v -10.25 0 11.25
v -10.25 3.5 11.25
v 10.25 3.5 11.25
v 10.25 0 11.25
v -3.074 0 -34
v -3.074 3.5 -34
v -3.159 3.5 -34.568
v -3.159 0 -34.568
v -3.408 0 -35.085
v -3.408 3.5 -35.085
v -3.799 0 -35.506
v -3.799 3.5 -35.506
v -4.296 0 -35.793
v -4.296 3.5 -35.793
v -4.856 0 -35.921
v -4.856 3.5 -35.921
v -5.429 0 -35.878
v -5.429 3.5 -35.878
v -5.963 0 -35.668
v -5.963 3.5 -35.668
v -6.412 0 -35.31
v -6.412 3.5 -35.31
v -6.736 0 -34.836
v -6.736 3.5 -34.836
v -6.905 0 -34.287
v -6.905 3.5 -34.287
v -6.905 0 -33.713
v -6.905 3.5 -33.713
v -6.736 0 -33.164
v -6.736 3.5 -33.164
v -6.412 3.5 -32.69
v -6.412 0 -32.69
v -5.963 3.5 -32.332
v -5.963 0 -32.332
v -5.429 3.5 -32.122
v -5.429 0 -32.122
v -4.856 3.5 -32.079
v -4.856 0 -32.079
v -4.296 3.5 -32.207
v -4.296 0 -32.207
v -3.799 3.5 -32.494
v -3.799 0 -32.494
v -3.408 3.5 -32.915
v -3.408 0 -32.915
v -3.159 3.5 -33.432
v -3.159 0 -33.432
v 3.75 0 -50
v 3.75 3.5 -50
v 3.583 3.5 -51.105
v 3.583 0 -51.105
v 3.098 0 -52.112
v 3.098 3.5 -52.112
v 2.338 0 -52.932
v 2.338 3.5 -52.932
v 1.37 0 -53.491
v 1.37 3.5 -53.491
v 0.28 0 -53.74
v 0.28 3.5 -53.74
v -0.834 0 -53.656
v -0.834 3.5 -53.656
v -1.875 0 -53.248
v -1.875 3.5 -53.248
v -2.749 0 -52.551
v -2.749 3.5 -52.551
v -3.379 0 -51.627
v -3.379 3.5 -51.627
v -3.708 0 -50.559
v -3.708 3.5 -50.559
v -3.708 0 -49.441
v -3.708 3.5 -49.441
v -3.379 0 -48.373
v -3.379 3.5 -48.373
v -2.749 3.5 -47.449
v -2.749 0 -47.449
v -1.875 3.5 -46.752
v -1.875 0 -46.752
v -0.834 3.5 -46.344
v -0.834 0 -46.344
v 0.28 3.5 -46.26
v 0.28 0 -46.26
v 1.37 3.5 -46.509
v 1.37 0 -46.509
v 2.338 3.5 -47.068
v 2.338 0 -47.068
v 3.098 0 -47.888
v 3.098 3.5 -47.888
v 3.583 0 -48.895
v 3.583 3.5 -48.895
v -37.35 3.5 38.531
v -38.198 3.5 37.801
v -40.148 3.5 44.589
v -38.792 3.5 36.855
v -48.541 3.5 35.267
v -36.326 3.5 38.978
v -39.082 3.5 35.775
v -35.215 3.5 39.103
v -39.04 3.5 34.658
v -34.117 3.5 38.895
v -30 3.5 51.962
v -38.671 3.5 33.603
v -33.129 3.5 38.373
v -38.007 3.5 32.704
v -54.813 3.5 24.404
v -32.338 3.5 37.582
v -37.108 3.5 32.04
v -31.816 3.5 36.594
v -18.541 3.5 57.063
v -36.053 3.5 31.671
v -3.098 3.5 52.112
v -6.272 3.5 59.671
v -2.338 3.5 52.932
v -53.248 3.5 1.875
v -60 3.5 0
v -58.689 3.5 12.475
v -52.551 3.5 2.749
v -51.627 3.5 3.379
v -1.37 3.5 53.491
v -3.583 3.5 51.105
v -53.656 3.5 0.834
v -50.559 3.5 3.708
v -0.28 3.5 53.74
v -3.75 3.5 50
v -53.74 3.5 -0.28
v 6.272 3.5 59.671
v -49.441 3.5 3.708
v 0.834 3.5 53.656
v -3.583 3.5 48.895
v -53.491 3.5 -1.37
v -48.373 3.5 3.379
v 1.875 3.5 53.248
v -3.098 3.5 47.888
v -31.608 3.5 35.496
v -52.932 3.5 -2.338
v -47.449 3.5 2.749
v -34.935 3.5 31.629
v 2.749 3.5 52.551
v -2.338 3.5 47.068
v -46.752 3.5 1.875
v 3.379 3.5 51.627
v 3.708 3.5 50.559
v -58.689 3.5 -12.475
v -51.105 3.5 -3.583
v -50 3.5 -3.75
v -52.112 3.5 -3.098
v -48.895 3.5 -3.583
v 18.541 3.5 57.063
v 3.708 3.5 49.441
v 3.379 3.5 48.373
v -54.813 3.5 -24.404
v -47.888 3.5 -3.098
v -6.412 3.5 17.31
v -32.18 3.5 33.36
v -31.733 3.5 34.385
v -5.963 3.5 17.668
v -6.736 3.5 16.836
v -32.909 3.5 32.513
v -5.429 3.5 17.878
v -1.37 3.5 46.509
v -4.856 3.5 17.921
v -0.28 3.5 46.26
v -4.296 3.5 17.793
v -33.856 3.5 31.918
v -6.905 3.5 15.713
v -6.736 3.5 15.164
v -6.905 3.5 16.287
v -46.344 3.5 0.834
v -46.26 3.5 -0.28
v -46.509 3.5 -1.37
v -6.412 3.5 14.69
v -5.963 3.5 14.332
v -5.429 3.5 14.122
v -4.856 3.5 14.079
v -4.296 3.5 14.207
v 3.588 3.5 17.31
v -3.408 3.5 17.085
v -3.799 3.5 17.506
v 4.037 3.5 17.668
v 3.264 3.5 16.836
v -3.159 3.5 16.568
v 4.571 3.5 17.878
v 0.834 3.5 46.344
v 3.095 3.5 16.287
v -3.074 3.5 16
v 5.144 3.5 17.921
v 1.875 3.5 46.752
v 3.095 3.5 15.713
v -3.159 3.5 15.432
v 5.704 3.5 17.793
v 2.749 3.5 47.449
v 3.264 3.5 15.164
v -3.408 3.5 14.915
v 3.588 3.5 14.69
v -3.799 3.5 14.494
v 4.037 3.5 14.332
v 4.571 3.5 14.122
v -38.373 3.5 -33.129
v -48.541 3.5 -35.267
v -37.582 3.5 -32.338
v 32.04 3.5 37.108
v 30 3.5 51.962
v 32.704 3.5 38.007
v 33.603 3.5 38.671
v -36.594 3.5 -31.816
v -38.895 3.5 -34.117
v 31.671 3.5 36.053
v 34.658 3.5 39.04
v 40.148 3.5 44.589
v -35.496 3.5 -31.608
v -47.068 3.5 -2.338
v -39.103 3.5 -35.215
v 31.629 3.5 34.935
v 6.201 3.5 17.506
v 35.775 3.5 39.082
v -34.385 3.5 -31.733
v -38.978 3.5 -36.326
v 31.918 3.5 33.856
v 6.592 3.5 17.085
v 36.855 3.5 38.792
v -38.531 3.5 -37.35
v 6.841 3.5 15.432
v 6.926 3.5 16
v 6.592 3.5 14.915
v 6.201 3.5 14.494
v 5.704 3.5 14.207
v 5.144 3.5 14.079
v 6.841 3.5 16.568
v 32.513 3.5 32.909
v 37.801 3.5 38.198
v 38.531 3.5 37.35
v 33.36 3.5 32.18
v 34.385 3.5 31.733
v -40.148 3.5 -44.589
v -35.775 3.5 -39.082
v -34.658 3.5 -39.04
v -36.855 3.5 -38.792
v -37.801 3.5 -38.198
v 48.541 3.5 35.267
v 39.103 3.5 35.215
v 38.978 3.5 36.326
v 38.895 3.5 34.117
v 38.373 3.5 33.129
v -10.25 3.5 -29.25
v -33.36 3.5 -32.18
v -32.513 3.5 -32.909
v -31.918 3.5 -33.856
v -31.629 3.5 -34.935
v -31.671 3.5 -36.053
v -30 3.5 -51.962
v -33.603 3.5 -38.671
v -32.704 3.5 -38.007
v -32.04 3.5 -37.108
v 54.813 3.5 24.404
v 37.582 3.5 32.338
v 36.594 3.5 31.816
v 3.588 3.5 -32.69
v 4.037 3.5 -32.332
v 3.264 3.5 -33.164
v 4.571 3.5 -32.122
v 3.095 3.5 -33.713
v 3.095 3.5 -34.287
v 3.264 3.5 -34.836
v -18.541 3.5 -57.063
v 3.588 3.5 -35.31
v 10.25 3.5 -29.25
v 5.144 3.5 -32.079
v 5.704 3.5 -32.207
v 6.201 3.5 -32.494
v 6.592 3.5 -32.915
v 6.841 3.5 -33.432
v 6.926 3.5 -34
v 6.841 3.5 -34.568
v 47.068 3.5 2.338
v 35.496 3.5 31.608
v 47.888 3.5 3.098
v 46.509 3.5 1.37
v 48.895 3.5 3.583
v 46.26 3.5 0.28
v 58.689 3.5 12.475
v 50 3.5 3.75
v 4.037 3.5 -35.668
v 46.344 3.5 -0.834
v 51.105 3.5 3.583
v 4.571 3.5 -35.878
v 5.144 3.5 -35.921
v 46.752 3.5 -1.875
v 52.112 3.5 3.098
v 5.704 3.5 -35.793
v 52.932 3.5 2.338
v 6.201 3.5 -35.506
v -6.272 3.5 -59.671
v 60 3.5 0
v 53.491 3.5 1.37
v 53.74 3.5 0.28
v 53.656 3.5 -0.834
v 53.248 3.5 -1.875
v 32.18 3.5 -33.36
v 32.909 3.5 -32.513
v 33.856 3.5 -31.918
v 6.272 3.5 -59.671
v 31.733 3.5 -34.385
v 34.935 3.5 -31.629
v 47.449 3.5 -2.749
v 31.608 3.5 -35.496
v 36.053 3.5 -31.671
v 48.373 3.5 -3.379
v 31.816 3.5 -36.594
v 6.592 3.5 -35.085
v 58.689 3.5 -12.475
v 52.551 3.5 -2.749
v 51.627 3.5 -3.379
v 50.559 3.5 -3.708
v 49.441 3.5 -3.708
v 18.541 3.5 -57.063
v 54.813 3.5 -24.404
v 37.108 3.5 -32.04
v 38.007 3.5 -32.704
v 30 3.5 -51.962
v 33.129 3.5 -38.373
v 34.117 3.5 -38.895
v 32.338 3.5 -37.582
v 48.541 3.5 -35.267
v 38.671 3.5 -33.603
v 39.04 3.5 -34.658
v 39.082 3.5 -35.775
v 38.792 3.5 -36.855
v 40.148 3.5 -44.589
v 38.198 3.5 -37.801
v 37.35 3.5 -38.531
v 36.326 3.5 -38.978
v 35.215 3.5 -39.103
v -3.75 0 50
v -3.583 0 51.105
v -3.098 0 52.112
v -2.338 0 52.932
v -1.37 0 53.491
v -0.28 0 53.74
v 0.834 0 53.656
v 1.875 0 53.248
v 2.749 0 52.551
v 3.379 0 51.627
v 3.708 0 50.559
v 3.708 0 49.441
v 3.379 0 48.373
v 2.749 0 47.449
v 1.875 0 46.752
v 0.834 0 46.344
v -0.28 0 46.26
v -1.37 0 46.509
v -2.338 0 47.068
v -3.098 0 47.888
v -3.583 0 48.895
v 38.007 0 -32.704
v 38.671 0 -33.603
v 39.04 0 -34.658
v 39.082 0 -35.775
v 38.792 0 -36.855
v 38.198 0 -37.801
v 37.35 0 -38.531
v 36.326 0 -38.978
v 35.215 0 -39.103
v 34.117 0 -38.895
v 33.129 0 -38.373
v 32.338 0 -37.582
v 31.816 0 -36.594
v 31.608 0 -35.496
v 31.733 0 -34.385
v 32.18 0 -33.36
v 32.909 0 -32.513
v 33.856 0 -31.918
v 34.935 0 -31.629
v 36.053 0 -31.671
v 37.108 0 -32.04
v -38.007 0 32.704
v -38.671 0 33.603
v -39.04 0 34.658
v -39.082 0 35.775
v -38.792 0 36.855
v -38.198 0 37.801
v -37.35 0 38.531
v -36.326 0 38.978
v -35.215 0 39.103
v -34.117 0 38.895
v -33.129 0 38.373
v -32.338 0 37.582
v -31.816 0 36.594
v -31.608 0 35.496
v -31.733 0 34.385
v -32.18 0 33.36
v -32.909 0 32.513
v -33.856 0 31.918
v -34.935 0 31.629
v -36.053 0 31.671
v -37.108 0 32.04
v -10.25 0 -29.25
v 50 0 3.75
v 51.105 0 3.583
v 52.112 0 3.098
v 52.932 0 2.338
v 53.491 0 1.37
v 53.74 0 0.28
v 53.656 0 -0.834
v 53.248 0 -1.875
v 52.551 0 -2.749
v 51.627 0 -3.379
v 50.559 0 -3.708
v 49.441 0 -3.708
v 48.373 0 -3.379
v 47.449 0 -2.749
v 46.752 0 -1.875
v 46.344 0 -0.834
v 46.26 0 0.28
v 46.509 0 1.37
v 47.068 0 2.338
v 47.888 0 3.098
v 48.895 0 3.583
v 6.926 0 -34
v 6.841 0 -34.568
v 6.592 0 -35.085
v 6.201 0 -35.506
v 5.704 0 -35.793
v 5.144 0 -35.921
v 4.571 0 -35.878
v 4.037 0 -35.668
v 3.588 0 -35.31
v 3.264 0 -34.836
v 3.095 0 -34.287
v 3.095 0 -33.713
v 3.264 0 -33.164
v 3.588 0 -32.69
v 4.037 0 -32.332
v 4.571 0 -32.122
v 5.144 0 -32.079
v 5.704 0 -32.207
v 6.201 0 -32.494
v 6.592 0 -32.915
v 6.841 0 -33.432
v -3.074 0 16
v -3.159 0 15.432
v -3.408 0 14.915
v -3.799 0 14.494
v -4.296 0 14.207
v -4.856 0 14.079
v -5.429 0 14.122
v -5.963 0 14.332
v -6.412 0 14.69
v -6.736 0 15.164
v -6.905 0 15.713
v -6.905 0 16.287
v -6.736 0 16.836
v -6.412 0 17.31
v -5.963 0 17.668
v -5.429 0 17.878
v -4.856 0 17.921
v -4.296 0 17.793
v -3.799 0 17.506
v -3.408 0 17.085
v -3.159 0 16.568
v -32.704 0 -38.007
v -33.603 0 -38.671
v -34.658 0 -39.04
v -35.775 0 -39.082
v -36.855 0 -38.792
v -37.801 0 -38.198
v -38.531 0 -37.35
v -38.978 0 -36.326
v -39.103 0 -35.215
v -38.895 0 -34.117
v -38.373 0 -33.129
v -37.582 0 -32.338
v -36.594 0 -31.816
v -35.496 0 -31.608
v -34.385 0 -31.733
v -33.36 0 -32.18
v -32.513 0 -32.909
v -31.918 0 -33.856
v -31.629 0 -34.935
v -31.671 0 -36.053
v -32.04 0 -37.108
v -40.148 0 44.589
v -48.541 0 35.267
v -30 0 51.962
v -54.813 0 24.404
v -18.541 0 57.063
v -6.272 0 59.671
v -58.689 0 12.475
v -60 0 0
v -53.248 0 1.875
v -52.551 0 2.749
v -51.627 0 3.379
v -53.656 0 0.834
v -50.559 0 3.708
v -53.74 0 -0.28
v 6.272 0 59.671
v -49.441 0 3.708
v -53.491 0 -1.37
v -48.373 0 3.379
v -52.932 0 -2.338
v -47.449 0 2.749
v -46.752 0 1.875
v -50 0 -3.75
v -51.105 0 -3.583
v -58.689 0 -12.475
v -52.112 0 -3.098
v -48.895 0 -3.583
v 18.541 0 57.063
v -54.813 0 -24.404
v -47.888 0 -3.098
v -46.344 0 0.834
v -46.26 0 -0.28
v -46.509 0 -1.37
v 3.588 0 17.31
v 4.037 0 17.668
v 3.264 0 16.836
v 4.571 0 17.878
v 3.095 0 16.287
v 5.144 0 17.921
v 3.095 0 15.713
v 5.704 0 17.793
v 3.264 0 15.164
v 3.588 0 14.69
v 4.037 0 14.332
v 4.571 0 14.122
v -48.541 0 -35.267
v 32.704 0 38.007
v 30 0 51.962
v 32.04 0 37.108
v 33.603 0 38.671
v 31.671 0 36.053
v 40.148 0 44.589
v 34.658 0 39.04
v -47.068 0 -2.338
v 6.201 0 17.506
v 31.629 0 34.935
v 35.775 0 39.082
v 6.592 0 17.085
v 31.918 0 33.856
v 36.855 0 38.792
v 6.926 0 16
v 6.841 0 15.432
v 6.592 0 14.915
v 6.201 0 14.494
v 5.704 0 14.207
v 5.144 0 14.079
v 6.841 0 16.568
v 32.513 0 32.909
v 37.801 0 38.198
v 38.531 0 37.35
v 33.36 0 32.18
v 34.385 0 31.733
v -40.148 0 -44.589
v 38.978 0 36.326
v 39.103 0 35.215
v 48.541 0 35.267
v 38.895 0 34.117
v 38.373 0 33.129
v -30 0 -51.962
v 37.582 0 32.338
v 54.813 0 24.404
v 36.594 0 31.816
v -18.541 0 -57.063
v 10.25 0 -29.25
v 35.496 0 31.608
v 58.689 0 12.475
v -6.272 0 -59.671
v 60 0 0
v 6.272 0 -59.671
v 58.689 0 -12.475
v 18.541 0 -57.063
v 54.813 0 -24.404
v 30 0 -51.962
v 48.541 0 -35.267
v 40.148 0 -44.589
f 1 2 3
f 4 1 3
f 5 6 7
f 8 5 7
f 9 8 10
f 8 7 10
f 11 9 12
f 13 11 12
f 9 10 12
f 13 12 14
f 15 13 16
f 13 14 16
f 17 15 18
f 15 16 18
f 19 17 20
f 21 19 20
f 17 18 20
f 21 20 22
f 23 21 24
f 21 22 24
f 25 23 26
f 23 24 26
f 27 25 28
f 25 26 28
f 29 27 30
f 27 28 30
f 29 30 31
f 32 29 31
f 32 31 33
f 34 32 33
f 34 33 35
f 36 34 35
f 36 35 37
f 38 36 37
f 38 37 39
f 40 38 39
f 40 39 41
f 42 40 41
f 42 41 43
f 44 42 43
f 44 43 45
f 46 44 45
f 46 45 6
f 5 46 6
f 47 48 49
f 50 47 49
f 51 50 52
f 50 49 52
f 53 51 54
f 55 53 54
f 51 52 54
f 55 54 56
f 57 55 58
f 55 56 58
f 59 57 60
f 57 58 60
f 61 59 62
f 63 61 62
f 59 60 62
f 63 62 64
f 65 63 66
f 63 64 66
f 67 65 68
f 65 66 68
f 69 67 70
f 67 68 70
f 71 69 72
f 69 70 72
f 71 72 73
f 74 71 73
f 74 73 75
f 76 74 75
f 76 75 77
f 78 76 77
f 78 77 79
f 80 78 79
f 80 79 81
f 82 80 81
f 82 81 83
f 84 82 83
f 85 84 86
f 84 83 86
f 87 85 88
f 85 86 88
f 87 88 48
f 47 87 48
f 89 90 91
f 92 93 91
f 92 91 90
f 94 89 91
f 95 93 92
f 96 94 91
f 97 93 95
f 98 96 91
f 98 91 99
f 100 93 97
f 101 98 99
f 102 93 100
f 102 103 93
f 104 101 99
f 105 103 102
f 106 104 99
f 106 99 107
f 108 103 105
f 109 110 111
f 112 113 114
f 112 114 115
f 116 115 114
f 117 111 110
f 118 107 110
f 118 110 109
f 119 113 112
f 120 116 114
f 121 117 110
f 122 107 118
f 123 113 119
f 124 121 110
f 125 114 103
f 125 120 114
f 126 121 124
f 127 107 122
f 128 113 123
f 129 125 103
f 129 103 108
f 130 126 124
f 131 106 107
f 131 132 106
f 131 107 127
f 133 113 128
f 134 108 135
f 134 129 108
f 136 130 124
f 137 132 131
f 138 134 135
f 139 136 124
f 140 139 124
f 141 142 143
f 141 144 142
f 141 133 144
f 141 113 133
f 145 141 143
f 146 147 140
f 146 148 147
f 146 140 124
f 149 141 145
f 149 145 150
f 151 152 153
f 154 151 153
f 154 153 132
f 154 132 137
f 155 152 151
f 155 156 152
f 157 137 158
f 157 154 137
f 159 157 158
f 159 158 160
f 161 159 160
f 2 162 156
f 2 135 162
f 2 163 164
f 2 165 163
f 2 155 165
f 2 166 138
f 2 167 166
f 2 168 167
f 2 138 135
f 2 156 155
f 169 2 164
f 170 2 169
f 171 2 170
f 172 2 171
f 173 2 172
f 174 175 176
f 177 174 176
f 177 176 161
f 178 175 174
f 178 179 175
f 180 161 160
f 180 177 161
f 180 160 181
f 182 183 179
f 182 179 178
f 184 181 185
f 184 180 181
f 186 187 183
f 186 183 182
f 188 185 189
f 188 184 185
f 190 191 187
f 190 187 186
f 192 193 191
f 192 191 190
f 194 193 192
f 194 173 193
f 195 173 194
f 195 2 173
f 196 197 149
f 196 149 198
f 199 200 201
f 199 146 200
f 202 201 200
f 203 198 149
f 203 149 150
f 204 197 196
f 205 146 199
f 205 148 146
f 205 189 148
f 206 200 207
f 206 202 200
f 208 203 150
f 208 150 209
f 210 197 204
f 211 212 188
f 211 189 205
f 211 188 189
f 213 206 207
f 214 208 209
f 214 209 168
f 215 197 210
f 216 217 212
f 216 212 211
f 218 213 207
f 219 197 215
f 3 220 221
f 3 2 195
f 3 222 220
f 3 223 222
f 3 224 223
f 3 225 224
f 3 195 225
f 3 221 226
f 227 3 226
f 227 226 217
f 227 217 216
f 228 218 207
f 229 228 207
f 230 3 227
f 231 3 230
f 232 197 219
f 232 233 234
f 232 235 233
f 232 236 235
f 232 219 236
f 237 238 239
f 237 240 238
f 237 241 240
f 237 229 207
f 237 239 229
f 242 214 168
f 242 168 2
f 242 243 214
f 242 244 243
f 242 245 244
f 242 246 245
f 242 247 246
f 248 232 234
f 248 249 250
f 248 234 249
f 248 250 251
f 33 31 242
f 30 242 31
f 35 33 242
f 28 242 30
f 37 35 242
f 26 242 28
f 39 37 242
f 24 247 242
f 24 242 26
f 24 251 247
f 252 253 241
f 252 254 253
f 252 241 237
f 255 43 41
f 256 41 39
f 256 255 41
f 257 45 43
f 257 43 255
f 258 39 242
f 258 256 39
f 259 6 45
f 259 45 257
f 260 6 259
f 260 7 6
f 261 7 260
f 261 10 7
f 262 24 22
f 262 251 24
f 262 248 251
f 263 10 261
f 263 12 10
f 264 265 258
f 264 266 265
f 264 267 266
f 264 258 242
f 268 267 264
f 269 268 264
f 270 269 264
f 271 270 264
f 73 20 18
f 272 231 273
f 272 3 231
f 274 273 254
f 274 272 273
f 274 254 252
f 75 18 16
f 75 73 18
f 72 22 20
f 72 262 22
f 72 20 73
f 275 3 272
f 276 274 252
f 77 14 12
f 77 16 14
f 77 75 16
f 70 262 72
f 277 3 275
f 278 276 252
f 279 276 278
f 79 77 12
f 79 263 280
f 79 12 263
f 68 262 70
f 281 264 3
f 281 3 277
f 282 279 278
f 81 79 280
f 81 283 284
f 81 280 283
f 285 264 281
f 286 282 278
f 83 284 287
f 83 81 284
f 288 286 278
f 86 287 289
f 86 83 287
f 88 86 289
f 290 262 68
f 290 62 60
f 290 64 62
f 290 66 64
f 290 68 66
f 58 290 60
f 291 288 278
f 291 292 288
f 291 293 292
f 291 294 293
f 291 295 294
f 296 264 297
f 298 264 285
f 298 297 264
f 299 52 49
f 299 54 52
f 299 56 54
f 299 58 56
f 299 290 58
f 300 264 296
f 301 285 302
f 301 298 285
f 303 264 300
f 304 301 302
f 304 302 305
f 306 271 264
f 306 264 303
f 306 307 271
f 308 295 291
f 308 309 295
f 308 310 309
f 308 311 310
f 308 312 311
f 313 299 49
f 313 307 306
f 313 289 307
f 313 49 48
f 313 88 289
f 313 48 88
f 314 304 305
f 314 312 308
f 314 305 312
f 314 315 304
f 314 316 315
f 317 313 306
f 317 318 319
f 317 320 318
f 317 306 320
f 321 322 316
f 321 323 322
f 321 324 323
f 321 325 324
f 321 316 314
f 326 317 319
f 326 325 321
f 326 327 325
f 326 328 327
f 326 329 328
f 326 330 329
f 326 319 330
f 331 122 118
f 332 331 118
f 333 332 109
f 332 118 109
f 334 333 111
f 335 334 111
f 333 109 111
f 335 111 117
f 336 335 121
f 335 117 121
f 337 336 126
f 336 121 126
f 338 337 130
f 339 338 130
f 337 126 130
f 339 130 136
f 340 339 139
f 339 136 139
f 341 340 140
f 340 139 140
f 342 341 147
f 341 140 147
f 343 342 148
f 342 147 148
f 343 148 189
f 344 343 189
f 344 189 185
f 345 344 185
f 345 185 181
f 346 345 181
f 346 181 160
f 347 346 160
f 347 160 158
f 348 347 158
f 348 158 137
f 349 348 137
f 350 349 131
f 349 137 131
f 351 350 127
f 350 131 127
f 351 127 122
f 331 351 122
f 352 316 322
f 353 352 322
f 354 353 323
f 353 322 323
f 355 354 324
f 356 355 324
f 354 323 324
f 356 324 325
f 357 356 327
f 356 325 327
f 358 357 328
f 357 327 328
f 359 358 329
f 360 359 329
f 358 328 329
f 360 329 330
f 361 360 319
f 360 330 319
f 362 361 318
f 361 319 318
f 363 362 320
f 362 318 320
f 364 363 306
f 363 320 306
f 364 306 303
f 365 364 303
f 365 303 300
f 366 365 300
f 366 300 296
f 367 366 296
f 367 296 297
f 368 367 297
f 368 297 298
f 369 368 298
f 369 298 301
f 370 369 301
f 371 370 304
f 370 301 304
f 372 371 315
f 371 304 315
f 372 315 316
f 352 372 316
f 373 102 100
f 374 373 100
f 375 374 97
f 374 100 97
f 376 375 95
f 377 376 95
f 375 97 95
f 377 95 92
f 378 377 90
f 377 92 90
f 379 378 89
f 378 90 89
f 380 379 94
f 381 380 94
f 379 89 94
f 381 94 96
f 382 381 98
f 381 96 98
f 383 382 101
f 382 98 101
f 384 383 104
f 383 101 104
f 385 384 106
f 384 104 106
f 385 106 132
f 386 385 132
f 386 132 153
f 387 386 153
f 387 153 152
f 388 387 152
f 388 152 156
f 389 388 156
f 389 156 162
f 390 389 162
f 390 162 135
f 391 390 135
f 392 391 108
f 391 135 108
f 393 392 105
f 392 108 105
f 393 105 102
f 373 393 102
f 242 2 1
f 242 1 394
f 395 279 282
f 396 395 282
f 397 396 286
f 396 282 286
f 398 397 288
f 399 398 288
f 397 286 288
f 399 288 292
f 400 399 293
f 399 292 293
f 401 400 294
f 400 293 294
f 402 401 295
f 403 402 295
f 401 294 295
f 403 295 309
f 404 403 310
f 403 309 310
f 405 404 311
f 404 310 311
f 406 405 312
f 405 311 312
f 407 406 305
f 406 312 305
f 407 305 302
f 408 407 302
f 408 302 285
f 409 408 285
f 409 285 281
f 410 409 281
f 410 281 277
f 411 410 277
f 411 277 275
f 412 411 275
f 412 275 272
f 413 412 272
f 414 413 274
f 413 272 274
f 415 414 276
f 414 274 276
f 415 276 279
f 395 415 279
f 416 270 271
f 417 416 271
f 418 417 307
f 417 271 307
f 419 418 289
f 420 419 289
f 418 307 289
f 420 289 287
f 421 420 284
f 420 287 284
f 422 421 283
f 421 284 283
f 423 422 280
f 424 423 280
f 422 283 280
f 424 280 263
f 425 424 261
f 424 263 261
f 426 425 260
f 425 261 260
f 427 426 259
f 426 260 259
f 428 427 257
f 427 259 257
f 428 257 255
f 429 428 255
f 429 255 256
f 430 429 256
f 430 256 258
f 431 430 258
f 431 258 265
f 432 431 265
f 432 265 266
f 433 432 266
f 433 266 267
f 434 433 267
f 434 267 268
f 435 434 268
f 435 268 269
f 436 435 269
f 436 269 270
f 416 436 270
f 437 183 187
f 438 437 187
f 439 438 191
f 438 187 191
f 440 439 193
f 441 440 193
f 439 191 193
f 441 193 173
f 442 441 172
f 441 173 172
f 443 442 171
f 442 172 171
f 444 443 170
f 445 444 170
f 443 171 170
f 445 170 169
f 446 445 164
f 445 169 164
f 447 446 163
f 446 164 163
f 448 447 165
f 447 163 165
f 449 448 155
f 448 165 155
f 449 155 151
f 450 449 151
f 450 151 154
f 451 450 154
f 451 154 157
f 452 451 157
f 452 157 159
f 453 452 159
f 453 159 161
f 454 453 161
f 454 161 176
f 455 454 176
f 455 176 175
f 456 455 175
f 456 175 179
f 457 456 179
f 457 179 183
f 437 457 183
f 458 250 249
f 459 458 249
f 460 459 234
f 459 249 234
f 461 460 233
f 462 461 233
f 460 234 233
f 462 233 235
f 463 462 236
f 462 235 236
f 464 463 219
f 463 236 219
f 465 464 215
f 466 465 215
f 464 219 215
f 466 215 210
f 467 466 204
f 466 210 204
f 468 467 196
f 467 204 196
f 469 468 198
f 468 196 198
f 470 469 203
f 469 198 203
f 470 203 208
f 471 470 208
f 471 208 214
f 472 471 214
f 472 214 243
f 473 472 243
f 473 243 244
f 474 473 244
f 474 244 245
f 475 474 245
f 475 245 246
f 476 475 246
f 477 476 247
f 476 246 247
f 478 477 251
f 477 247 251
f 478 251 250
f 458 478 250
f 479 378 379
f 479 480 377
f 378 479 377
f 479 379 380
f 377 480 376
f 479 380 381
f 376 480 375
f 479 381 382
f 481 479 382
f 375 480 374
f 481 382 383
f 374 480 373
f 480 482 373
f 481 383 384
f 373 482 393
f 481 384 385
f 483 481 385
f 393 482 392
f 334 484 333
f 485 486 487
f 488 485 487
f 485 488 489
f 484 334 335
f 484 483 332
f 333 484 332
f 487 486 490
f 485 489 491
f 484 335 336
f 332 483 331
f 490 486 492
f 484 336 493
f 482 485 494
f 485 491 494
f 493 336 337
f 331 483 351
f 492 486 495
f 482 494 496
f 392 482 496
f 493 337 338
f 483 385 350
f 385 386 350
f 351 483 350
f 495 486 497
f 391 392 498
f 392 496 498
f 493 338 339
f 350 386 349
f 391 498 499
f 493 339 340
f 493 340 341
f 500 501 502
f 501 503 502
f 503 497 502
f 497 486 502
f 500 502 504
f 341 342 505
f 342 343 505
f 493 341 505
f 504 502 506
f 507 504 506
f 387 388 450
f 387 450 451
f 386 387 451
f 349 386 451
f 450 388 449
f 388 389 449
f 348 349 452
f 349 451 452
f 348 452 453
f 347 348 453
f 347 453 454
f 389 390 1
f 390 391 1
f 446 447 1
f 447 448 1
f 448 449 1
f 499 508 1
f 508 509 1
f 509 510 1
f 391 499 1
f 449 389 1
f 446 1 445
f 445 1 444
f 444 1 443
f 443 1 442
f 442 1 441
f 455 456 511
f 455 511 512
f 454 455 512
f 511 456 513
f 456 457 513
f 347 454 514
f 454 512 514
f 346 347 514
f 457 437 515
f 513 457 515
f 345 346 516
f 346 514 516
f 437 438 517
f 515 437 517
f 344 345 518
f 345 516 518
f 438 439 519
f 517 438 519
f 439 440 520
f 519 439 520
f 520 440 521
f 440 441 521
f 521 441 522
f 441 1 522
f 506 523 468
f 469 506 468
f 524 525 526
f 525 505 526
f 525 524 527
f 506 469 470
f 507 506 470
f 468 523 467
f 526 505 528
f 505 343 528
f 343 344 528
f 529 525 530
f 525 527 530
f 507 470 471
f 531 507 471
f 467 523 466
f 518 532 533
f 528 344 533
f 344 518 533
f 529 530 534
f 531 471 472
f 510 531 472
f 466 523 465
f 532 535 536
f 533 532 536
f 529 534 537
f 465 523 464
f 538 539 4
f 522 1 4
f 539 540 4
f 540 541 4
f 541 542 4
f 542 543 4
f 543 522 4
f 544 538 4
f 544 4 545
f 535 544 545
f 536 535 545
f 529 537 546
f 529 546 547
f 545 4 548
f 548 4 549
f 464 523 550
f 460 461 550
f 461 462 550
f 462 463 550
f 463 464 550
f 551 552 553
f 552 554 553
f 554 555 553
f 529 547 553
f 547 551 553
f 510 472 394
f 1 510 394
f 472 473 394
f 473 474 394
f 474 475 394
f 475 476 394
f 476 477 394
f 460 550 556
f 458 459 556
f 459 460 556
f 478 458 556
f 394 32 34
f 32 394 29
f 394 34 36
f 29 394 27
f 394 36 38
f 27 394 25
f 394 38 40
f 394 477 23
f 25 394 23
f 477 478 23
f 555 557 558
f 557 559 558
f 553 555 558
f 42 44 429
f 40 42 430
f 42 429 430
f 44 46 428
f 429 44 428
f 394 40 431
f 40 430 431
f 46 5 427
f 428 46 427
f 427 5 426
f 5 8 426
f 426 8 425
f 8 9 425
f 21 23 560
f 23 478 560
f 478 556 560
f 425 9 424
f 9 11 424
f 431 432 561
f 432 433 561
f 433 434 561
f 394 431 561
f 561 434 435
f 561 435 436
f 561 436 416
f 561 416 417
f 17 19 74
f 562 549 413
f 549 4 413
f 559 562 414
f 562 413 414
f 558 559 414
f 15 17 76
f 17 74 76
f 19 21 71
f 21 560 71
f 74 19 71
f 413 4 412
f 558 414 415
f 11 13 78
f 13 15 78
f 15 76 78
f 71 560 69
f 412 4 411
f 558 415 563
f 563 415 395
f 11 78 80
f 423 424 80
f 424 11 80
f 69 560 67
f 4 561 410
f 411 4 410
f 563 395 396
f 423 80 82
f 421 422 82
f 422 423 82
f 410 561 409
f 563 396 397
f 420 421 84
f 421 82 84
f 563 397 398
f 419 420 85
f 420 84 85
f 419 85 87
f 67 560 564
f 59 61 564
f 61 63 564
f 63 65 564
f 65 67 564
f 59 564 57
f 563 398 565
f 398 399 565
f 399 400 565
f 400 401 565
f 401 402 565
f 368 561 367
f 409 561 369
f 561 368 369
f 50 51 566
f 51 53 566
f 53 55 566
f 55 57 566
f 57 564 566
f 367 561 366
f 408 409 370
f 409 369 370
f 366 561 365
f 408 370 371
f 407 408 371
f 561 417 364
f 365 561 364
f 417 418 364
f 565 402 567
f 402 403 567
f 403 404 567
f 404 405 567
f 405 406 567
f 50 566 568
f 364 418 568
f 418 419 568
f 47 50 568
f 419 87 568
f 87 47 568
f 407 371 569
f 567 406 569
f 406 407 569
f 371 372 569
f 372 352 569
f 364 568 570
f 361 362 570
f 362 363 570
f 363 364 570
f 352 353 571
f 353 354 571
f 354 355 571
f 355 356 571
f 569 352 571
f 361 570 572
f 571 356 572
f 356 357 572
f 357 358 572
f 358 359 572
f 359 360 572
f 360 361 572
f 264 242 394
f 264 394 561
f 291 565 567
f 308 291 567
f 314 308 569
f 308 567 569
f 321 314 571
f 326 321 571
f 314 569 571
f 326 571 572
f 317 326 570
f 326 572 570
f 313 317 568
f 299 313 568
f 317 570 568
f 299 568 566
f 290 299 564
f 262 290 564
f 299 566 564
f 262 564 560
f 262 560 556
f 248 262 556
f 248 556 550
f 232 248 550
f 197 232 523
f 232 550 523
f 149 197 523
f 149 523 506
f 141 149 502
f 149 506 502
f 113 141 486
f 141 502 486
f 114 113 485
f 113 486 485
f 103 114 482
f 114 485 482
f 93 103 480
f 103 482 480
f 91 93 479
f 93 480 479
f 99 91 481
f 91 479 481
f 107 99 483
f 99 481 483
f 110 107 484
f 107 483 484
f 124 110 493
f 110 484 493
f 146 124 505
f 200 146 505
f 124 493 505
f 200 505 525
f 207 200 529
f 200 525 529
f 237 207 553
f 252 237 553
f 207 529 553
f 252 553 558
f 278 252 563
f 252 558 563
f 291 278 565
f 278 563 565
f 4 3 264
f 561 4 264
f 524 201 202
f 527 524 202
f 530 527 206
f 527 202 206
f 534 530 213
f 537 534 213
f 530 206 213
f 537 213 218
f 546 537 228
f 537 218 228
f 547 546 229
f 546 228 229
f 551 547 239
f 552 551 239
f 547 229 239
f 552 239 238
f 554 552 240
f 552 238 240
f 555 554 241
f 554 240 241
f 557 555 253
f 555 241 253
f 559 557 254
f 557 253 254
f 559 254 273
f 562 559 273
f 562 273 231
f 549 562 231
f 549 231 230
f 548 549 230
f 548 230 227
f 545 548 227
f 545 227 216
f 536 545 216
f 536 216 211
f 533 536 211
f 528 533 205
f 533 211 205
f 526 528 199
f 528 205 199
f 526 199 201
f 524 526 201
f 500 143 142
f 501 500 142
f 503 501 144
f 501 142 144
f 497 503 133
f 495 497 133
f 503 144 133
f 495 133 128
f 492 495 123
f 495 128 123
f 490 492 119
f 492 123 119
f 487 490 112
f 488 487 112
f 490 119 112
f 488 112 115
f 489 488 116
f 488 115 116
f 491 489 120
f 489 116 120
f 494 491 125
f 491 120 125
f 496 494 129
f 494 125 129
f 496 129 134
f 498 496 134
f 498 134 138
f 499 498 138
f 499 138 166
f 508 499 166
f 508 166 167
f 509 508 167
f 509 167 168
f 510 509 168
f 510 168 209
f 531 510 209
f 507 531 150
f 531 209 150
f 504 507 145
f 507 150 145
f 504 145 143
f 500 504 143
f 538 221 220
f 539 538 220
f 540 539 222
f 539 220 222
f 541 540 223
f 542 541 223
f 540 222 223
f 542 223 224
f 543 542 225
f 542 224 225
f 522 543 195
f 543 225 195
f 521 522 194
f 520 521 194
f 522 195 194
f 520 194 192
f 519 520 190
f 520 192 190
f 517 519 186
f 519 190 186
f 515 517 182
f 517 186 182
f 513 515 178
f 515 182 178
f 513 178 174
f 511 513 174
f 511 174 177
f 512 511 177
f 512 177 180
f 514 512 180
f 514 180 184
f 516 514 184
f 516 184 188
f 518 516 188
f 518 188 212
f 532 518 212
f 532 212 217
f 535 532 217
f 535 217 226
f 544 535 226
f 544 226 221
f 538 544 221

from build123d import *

# Parameters (mm, degrees)
CROQUIS1_R              = 60
SALIENTE_EXTRUIR1_DEPTH = 3.5
CROQUIS2_R              = 3.75
CORTAR_EXTRUIR1_DEPTH   = 3.5
MATRIZC1_COUNT          = 8
CORTAR_EXTRUIR3_REACH   = 5.5
CROQUIS4_R              = 1.92644479
CORTAR_EXTRUIR4_REACH   = 5.5
CROQUIS5_W              = 20.5
CROQUIS5_H              = 40.5


with BuildPart() as part:
    # Croquis1 → Saliente-Extruir1 (new body)
    with BuildSketch(Plane(origin=(0, 0, 0), x_dir=(1, 0, 0), z_dir=(0, 1, 0))):
        Circle(CROQUIS1_R)
    extrude(amount=SALIENTE_EXTRUIR1_DEPTH)

    # Croquis2 → Cortar-Extruir1 (cut)
    with BuildSketch(Plane(origin=(0, 3.5, 0), x_dir=(1, 0, 0), z_dir=(0, 1, 0))):
        with Locations((0, 50)):
            Circle(CROQUIS2_R)
    cortar_extruir1 = extrude(amount=-CORTAR_EXTRUIR1_DEPTH, mode=Mode.SUBTRACT)

    # MatrizC1: Cortar-Extruir1 ×8 about axis
    matrizc1_axis = Axis((0, 0, 0), (0, 1, 0))
    for i in range(1, MATRIZC1_COUNT):
        add(cortar_extruir1.rotate(matrizc1_axis, i * 360 / MATRIZC1_COUNT), mode=Mode.SUBTRACT)

    # Croquis4 → Cortar-Extruir3 (cut, up to next)
    with BuildSketch(Plane(origin=(0, 3.5, 0), x_dir=(1, 0, 0), z_dir=(0, 1, 0)), mode=Mode.PRIVATE) as cortar_extruir3_sk1:
        with Locations((5, 34)):
            Circle(CROQUIS4_R)
    cortar_extruir3_tool1 = extrude(cortar_extruir3_sk1.sketch, amount=-CORTAR_EXTRUIR3_REACH, mode=Mode.PRIVATE) & part.part
    add(cortar_extruir3_tool1.solids().sort_by_distance((5, 3.5, -34))[0], mode=Mode.SUBTRACT)
    # Croquis4 → Cortar-Extruir3 (cut, up to next)
    with BuildSketch(Plane(origin=(0, 3.5, 0), x_dir=(1, 0, 0), z_dir=(0, 1, 0)), mode=Mode.PRIVATE) as cortar_extruir3_sk2:
        with Locations((5, -16)):
            Circle(CROQUIS4_R)
    cortar_extruir3_tool2 = extrude(cortar_extruir3_sk2.sketch, amount=-CORTAR_EXTRUIR3_REACH, mode=Mode.PRIVATE) & part.part
    add(cortar_extruir3_tool2.solids().sort_by_distance((5, 3.5, 16))[0], mode=Mode.SUBTRACT)
    # Croquis4 → Cortar-Extruir3 (cut, up to next)
    with BuildSketch(Plane(origin=(0, 3.5, 0), x_dir=(1, 0, 0), z_dir=(0, 1, 0)), mode=Mode.PRIVATE) as cortar_extruir3_sk3:
        with Locations((-5, 34)):
            Circle(CROQUIS4_R)
    cortar_extruir3_tool3 = extrude(cortar_extruir3_sk3.sketch, amount=-CORTAR_EXTRUIR3_REACH, mode=Mode.PRIVATE) & part.part
    add(cortar_extruir3_tool3.solids().sort_by_distance((-5, 3.5, -34))[0], mode=Mode.SUBTRACT)
    # Croquis4 → Cortar-Extruir3 (cut, up to next)
    with BuildSketch(Plane(origin=(0, 3.5, 0), x_dir=(1, 0, 0), z_dir=(0, 1, 0)), mode=Mode.PRIVATE) as cortar_extruir3_sk4:
        with Locations((-5, -16)):
            Circle(CROQUIS4_R)
    cortar_extruir3_tool4 = extrude(cortar_extruir3_sk4.sketch, amount=-CORTAR_EXTRUIR3_REACH, mode=Mode.PRIVATE) & part.part
    add(cortar_extruir3_tool4.solids().sort_by_distance((-5, 3.5, 16))[0], mode=Mode.SUBTRACT)

    # Croquis5 → Cortar-Extruir4 (cut, up to next)
    with BuildSketch(Plane(origin=(0, 3.5, 0), x_dir=(1, 0, 0), z_dir=(0, 1, 0)), mode=Mode.PRIVATE) as cortar_extruir4_sk1:
        with Locations((0, 9)):
            Rectangle(CROQUIS5_W, CROQUIS5_H)
    cortar_extruir4_tool1 = extrude(cortar_extruir4_sk1.sketch, amount=-CORTAR_EXTRUIR4_REACH, mode=Mode.PRIVATE) & part.part
    add(cortar_extruir4_tool1.solids().sort_by_distance((0, 3.5, -9))[0], mode=Mode.SUBTRACT)


solid = part.part
